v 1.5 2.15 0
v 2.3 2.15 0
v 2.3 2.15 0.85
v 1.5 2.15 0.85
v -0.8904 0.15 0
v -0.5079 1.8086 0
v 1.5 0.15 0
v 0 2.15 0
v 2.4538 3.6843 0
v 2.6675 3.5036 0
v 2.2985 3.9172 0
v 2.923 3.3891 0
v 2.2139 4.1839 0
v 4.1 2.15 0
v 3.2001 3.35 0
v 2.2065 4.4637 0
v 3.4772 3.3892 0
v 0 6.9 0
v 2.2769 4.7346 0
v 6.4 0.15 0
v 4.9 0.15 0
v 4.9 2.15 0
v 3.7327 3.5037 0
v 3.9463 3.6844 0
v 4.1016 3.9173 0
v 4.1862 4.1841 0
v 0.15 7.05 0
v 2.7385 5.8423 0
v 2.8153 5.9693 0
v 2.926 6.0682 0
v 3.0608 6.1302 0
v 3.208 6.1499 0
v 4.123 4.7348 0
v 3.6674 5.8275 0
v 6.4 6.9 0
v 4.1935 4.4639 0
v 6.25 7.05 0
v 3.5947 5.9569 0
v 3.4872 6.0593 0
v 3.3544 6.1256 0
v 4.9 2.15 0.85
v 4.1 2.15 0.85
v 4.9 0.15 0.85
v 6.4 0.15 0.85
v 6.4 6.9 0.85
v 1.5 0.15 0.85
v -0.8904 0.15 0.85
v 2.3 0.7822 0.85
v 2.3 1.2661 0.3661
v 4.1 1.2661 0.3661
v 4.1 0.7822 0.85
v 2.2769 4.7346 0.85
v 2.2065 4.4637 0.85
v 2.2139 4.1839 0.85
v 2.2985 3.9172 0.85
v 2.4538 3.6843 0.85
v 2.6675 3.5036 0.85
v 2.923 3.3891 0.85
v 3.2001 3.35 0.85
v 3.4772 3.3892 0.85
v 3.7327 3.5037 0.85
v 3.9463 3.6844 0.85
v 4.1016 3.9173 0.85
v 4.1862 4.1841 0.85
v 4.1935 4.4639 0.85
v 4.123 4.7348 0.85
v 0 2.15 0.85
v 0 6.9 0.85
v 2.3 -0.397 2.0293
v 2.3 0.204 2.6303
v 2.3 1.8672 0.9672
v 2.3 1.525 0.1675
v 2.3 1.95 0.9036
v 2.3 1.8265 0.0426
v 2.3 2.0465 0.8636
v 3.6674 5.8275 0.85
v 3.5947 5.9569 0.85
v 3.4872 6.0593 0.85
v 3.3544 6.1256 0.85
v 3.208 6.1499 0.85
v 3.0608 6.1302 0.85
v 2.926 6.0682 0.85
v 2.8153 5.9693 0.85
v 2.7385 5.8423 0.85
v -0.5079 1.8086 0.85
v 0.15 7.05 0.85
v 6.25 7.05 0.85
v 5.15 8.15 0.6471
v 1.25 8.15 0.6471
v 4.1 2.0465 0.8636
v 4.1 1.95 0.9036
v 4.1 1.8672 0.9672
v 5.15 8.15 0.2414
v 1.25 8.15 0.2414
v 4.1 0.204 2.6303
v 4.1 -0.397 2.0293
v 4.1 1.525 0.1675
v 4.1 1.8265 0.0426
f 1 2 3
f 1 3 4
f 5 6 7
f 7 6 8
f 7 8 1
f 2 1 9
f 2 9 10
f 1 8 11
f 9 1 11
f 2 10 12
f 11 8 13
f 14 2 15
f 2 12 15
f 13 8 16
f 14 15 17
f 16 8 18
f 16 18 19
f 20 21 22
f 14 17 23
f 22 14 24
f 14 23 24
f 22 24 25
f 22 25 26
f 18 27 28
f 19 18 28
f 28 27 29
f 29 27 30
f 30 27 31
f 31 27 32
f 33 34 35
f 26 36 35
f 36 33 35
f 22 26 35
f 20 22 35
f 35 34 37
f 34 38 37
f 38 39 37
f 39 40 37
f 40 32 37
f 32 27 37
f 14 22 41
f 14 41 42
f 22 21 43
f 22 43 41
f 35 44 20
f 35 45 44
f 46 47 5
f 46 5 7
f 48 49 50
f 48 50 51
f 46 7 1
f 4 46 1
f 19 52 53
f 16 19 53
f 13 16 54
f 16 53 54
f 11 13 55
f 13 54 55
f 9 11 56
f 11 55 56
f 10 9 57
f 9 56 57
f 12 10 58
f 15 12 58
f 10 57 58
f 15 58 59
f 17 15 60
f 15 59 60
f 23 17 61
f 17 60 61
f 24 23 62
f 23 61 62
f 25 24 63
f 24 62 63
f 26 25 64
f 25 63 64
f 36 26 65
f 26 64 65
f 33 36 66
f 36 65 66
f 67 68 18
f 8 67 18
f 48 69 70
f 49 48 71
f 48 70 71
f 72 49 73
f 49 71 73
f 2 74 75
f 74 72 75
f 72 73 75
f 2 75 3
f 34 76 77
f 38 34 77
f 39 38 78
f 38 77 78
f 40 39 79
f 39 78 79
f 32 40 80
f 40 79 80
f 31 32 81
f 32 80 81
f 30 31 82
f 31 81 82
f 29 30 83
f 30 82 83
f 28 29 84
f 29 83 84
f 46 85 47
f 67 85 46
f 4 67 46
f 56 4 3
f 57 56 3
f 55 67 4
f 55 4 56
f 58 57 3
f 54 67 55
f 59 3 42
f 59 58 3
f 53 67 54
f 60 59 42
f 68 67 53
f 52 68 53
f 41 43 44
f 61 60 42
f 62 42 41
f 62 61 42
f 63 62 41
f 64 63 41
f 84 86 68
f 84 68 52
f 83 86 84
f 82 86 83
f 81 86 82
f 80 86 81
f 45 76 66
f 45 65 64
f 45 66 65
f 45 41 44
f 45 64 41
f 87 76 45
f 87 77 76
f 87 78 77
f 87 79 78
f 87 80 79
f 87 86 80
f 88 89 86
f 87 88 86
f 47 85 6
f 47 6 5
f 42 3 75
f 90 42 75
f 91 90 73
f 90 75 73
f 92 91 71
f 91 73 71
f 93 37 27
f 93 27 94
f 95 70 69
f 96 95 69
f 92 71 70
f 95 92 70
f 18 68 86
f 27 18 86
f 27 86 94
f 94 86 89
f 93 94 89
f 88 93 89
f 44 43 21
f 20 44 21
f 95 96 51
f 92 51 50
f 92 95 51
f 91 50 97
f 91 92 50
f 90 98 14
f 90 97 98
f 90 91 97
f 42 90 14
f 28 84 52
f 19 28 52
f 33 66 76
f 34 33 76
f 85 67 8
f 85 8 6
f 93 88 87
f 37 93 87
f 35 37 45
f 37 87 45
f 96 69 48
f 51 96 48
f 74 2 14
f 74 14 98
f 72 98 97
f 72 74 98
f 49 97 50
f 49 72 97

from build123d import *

# Parameters (mm, degrees)
BOSS_EXTRUDE1_DEPTH    = 6.4
CUT_EXTRUDE1_REACH     = 12.397
CUT_EXTRUDE2_DEPTH     = 0.85
SKETCH6_W              = 0.8
SKETCH6_H              = 2
CUT_EXTRUDE3_DEPTH     = 0.85
SKETCH7_W              = 1.8
SKETCH7_H              = 0.85
BOSS_EXTRUDE2_DEPTH    = 1
SKETCHED_START         = 2.3
SKETCHED_BEND1_DEPTH   = 1.8
SKETCHED_BEND1_2_DEPTH = 1.8
BOSS_EXTRUDE3_DEPTH    = 0.85


# Read off the part's stored shape, not the designer's step: Sketched Bend1
with BuildPart() as part:
    # Sketch1 → Boss-Extrude1 (new body)
    with BuildSketch(Plane(origin=(0, 0, 0), x_dir=(0, 0, -1), z_dir=(1, 0, 0))):
        Polygon((0, 0.15), (0, 7.05), (-0.241393443, 8.15), (-0.647131148, 8.15), (-0.85, 7.05), (-0.85, 0.15), align=None)
    extrude(amount=BOSS_EXTRUDE1_DEPTH)

    # Cut-Extrude1: up to this face of the body (flat: up to its plane)
    cut_extrude1_end = Plane(part.part.faces().sort_by_distance((3.2, 3.6, 0))[0])
    # Sketch4 → Cut-Extrude1 (cut, up to the picked face)
    with BuildSketch(Plane.XY.offset(0.85), mode=Mode.PRIVATE) as cut_extrude1_sk1:
        Polygon((0, 6.9), (1.25, 8.15), (0, 8.15), align=None)
    cut_extrude1_tool1 = split(extrude(cut_extrude1_sk1.sketch, amount=-CUT_EXTRUDE1_REACH, mode=Mode.PRIVATE), bisect_by=cut_extrude1_end, keep=Keep.BOTH, mode=Mode.PRIVATE)
    # Sketch4 → Cut-Extrude1 (cut, up to the picked face)
    with BuildSketch(Plane.XY.offset(0.85), mode=Mode.PRIVATE) as cut_extrude1_sk2:
        Polygon((5.15, 8.15), (6.4, 6.9), (6.4, 8.15), align=None)
    cut_extrude1_tool2 = split(extrude(cut_extrude1_sk2.sketch, amount=-CUT_EXTRUDE1_REACH, mode=Mode.PRIVATE), bisect_by=cut_extrude1_end, keep=Keep.BOTH, mode=Mode.PRIVATE)
    add(cut_extrude1_tool1.solids().sort_by(Axis((0.416667, 7.733333, 0.85), (0, 0, -1)))[0], mode=Mode.SUBTRACT)
    add(cut_extrude1_tool2.solids().sort_by(Axis((5.983333, 7.733333, 0.85), (0, 0, -1)))[0], mode=Mode.SUBTRACT)

    # Sketch5 → Cut-Extrude2 (cut)
    with BuildSketch(Plane.XY.offset(0.85)):
        with BuildLine():
            Line((2.738461538, 5.842307692), (2.276923077, 4.734615385))
            ThreePointArc((2.276923077, 4.734615385), (3.20010742, 3.350000006), (4.122994271, 4.734813689))
            Line((4.122994271, 4.734813689), (3.667436975, 5.827489929))
            ThreePointArc((3.667436975, 5.827489929), (3.207974312, 6.149936406), (2.738461538, 5.842307692))
        make_face()
    extrude(amount=-CUT_EXTRUDE2_DEPTH, mode=Mode.SUBTRACT)

    # Sketch6 → Cut-Extrude3 (cut)
    with BuildSketch(Plane(origin=(0, 0, 0), x_dir=(-1, 0, 0), z_dir=(0, 0, -1))):
        with Locations((-4.5, 1.15)):
            Rectangle(SKETCH6_W, SKETCH6_H)
        with Locations((-1.9, 1.15)):
            Rectangle(SKETCH6_W, SKETCH6_H)
    extrude(amount=-CUT_EXTRUDE3_DEPTH, mode=Mode.SUBTRACT)

    # Sketch7 → Boss-Extrude2 (add)
    with BuildSketch(Plane.XZ.offset(-0.15)):
        with Locations((3.2, 0.425)):
            Rectangle(SKETCH7_W, SKETCH7_H)
    extrude(amount=BOSS_EXTRUDE2_DEPTH)

    # Sketched Bend1 outline → Sketched Bend1 (cut)
    with BuildSketch(Plane.YZ.offset(SKETCHED_START)):
        with BuildLine():
            Line((1.266116524, 0.366116524), (0.782233048, 0.85))
            Line((0.782233048, 0.85), (-0.85, 0.85))
            Line((-0.85, 0.85), (-0.85, 0))
            Line((-0.85, 0), (2.15, 0))
            ThreePointArc((2.15, 0), (1.67164571, 0.095150584), (1.266116524, 0.366116524))
        make_face()
    extrude(amount=SKETCHED_BEND1_DEPTH, mode=Mode.SUBTRACT)

    # Sketched Bend1 2 outline → Sketched Bend1 2 (add)
    with BuildSketch(Plane.YZ.offset(SKETCHED_START)):
        with BuildLine():
            ThreePointArc((2.15, 0.85), (1.996926627, 0.880448187), (1.867157288, 0.967157288))
            Line((1.867157288, 0.967157288), (0.204009247, 2.630305328))
            Line((0.204009247, 2.630305328), (-0.397031517, 2.029264564))
            Line((-0.397031517, 2.029264564), (0.782233048, 0.85))
            Line((0.782233048, 0.85), (2.15, 0.85))
        make_face()
    extrude(amount=SKETCHED_BEND1_2_DEPTH)

    # Sketch15 → Boss-Extrude3 (add)
    with BuildSketch(Plane.XY.offset(0.85)):
        Polygon((0, 2.15), (-0.50789834, 1.808617859), (-0.890356386, 0.15), (0, 0.15), align=None)
    extrude(amount=-BOSS_EXTRUDE3_DEPTH)


solid = part.part
